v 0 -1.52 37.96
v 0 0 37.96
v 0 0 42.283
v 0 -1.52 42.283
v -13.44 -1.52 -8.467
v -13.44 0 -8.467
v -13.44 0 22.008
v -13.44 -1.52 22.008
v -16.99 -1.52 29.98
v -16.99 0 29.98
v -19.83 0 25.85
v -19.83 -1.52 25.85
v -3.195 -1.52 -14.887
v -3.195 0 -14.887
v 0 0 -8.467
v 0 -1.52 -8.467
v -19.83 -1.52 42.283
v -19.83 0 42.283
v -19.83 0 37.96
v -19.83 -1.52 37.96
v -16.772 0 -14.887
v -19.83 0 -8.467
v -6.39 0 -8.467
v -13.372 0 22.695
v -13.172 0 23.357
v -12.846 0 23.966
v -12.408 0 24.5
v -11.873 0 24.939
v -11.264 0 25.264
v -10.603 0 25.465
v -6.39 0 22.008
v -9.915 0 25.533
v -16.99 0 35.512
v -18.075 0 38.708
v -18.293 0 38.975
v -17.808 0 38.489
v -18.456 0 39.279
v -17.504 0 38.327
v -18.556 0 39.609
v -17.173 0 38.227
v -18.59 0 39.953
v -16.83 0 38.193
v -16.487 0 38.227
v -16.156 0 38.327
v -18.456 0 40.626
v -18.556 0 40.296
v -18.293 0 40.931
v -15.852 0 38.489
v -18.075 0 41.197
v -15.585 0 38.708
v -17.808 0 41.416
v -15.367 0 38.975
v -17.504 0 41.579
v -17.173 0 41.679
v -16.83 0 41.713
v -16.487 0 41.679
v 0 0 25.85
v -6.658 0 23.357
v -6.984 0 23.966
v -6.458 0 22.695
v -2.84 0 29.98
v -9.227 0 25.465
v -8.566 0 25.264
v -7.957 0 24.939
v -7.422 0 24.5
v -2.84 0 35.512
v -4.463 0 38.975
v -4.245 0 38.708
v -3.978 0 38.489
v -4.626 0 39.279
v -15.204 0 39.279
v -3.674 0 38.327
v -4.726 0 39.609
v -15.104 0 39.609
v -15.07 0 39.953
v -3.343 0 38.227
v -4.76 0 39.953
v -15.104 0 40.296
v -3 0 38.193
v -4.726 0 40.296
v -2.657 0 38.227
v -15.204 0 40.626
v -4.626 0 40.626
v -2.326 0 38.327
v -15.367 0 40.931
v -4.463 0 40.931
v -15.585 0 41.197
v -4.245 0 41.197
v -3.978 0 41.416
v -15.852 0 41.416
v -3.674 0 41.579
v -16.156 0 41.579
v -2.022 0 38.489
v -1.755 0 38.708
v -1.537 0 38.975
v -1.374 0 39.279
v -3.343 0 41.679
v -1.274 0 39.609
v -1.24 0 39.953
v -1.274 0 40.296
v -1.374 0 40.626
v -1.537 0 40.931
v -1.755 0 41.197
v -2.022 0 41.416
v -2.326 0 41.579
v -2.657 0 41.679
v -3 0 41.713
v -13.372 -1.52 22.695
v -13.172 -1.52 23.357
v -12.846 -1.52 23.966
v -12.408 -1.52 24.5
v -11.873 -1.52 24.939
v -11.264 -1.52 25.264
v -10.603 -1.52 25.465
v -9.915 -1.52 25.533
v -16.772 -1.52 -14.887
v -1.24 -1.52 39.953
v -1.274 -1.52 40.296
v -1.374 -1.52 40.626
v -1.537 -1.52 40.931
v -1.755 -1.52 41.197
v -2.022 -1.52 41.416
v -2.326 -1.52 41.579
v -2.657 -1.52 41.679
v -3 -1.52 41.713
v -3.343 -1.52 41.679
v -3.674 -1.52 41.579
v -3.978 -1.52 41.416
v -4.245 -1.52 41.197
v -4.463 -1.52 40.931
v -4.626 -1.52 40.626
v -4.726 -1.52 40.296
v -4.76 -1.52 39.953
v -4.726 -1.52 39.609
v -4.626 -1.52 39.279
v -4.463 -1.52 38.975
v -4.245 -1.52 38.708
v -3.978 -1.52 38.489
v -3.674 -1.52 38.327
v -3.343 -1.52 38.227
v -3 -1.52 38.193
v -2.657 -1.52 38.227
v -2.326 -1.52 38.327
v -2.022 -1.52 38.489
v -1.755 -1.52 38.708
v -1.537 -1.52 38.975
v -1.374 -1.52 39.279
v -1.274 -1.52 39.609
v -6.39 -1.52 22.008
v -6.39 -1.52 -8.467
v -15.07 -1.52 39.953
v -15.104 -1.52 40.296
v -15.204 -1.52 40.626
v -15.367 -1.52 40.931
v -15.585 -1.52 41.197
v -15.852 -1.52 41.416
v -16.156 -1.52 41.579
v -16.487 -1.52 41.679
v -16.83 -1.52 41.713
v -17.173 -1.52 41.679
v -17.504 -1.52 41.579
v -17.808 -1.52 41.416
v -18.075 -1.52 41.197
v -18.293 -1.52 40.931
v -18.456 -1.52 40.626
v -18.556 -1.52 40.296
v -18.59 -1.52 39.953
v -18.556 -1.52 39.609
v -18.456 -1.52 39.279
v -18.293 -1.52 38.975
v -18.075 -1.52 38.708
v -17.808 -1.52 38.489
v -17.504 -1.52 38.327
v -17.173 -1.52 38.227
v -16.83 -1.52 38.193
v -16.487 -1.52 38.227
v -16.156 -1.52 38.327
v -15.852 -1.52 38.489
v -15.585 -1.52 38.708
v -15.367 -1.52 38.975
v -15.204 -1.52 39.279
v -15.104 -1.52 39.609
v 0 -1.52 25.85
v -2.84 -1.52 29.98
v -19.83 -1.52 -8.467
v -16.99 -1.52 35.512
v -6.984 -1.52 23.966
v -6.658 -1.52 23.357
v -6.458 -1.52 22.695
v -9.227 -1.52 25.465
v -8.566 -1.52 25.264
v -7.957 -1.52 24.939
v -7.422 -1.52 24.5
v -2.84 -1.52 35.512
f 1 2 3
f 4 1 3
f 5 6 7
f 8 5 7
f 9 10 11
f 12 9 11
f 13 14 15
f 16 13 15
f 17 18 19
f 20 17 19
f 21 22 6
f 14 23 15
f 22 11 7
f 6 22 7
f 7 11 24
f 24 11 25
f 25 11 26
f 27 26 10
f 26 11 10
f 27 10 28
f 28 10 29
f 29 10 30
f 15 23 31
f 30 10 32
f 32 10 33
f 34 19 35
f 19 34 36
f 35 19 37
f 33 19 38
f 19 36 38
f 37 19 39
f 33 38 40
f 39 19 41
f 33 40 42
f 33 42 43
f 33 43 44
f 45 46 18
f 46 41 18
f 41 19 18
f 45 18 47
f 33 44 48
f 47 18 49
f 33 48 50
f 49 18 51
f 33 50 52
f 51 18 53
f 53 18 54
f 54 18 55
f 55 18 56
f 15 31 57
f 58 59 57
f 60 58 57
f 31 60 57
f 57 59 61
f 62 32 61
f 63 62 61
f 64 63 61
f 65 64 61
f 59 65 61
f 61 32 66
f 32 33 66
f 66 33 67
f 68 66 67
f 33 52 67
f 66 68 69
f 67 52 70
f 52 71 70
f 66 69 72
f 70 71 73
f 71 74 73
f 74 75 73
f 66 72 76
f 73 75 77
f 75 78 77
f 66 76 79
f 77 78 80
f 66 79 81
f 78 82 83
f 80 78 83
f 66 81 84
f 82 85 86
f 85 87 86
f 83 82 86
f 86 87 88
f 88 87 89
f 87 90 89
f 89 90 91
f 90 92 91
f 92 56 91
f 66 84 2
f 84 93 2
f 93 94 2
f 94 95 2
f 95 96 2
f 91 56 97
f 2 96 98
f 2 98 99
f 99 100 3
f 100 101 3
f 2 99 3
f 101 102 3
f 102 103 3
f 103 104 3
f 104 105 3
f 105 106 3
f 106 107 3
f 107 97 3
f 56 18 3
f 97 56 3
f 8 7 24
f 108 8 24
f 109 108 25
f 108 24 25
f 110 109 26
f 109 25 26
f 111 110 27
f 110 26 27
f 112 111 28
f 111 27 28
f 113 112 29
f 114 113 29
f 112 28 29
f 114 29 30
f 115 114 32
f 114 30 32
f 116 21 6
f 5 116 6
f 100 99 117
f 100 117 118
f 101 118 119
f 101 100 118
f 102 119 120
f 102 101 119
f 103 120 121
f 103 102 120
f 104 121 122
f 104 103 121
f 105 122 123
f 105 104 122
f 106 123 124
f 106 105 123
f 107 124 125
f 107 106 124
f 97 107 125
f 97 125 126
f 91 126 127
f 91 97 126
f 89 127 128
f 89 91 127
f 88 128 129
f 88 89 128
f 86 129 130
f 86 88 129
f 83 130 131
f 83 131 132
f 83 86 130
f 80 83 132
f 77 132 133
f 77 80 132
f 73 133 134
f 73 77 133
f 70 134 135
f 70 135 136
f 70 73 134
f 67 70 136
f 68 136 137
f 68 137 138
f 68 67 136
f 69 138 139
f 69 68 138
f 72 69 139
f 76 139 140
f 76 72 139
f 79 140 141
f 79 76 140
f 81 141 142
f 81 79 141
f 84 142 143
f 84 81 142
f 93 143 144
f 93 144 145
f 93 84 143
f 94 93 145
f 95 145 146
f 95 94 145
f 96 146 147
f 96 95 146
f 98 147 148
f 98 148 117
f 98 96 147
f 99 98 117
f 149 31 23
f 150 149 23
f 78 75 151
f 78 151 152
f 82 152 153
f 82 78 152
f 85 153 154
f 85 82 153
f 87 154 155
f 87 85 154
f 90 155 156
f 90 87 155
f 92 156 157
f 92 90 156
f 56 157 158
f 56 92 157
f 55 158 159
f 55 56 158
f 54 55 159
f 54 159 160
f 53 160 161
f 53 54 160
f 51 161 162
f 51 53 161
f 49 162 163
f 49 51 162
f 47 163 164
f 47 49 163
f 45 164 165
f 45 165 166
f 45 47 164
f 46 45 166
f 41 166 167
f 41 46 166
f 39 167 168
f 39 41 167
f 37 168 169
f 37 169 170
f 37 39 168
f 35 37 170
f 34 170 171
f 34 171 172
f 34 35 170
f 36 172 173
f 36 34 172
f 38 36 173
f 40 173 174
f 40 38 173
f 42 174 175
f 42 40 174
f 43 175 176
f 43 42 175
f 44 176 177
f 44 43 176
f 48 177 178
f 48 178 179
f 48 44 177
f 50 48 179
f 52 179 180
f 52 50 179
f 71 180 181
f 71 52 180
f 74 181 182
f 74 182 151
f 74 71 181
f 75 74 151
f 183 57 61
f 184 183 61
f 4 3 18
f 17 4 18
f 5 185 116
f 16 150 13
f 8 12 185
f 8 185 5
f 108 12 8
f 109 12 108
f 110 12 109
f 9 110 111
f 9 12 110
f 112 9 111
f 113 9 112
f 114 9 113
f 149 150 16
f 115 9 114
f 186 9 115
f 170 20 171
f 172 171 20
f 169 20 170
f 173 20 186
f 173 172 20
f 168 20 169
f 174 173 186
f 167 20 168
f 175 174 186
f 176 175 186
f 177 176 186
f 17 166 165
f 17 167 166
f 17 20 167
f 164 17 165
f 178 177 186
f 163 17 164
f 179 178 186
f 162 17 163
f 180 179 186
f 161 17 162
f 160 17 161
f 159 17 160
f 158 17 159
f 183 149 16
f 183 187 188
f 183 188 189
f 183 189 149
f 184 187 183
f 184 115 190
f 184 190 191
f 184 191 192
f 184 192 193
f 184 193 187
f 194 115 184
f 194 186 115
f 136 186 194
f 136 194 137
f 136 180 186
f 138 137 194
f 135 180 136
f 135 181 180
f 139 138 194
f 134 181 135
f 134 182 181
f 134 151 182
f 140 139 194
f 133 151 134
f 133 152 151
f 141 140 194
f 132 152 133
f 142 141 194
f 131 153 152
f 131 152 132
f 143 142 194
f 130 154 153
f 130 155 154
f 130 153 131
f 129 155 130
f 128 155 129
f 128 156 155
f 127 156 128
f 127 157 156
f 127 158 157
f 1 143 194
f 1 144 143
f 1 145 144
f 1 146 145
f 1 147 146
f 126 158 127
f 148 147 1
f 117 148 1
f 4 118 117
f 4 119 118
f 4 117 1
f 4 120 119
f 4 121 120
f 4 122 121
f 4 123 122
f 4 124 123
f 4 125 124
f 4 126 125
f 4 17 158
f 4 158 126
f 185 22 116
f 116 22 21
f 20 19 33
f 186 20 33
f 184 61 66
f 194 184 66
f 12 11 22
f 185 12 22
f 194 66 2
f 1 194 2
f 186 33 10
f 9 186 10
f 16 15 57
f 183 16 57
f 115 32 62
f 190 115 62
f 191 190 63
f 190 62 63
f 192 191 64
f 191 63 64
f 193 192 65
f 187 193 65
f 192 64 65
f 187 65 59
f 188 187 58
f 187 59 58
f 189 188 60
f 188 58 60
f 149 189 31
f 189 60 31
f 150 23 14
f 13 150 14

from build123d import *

# Parameters (mm, degrees)
F0_R     = 1.76
F1_DEPTH = 1.52


# Not quite as in the source:
# - a feature of the source that left no trace in its solid (it failed there, or was rolled back) is left out


with BuildPart() as f1:
    # F0 (on Front) → F1 (new body)
    with BuildSketch(Plane.XZ):
        Polygon((-13.44, 42.2827300502), (-19.83, 42.2827300502), (-19.83, 41.2284731865), (-19.83, 38.147136569), (-19.83, 37.9599481821), (-16.99, 35.5119891465), (-16.99, 29.9802143127), (-19.83, 25.8499481821), (-19.83, 25.4327300502), (-19.83, 22.0077300502), (-13.44, 22.0077300502), align=None)
        with Locations((-16.83, 39.9527300502)):
            Circle(F0_R, mode=Mode.SUBTRACT)
        with BuildLine():
            Line((-9.915, 42.2827300502), (-13.44, 42.2827300502))
            Line((-13.44, 42.2827300502), (-13.44, 22.0077300502))
            ThreePointArc((-13.44, 22.0077300502), (-12.4075514037, 24.5002814538), (-9.915, 25.5327300502))
            Line((-9.915, 25.5327300502), (-9.915, 42.2827300502))
        make_face()
        Polygon((-13.44, 22.0005065203), (-13.44, 22.0077300502), (-19.83, 22.0077300502), (-19.83, -8.4672699498), (-13.44, -8.4672699498), align=None)
        with BuildLine():
            Line((-6.39, 42.2827300502), (-9.915, 42.2827300502))
            Line((-9.915, 42.2827300502), (-9.915, 25.5327300502))
            ThreePointArc((-9.915, 25.5327300502), (-7.4224485963, 24.5002814538), (-6.39, 22.0077300502))
            Line((-6.39, 22.0077300502), (-6.39, 23.0757091194))
            Line((-6.39, 23.0757091194), (-6.39, 42.2827300502))
        make_face()
        Polygon((0, 42.2827300502), (-6.39, 42.2827300502), (-6.39, 23.0757091194), (-6.39, 22.0077300502), (-6.39, -8.4672699498), (0, -8.4672699498), (0, 25.4327300502), (0, 25.8499481821), (-2.84, 29.9802143127), (-2.84, 35.5119891465), (0, 37.9599481821), (0, 41.2284731865), align=None)
        with Locations((-3, 39.9527300502)):
            Circle(F0_R, mode=Mode.SUBTRACT)
        Polygon((-16.7724229395, -14.8872699498), (-13.44, -8.4672699498), (-19.83, -8.4672699498), align=None)
        Polygon((0, -8.4672699498), (-6.39, -8.4672699498), (-3.195, -14.8872699498), align=None)
    extrude(amount=F1_DEPTH)


solid = f1.part
